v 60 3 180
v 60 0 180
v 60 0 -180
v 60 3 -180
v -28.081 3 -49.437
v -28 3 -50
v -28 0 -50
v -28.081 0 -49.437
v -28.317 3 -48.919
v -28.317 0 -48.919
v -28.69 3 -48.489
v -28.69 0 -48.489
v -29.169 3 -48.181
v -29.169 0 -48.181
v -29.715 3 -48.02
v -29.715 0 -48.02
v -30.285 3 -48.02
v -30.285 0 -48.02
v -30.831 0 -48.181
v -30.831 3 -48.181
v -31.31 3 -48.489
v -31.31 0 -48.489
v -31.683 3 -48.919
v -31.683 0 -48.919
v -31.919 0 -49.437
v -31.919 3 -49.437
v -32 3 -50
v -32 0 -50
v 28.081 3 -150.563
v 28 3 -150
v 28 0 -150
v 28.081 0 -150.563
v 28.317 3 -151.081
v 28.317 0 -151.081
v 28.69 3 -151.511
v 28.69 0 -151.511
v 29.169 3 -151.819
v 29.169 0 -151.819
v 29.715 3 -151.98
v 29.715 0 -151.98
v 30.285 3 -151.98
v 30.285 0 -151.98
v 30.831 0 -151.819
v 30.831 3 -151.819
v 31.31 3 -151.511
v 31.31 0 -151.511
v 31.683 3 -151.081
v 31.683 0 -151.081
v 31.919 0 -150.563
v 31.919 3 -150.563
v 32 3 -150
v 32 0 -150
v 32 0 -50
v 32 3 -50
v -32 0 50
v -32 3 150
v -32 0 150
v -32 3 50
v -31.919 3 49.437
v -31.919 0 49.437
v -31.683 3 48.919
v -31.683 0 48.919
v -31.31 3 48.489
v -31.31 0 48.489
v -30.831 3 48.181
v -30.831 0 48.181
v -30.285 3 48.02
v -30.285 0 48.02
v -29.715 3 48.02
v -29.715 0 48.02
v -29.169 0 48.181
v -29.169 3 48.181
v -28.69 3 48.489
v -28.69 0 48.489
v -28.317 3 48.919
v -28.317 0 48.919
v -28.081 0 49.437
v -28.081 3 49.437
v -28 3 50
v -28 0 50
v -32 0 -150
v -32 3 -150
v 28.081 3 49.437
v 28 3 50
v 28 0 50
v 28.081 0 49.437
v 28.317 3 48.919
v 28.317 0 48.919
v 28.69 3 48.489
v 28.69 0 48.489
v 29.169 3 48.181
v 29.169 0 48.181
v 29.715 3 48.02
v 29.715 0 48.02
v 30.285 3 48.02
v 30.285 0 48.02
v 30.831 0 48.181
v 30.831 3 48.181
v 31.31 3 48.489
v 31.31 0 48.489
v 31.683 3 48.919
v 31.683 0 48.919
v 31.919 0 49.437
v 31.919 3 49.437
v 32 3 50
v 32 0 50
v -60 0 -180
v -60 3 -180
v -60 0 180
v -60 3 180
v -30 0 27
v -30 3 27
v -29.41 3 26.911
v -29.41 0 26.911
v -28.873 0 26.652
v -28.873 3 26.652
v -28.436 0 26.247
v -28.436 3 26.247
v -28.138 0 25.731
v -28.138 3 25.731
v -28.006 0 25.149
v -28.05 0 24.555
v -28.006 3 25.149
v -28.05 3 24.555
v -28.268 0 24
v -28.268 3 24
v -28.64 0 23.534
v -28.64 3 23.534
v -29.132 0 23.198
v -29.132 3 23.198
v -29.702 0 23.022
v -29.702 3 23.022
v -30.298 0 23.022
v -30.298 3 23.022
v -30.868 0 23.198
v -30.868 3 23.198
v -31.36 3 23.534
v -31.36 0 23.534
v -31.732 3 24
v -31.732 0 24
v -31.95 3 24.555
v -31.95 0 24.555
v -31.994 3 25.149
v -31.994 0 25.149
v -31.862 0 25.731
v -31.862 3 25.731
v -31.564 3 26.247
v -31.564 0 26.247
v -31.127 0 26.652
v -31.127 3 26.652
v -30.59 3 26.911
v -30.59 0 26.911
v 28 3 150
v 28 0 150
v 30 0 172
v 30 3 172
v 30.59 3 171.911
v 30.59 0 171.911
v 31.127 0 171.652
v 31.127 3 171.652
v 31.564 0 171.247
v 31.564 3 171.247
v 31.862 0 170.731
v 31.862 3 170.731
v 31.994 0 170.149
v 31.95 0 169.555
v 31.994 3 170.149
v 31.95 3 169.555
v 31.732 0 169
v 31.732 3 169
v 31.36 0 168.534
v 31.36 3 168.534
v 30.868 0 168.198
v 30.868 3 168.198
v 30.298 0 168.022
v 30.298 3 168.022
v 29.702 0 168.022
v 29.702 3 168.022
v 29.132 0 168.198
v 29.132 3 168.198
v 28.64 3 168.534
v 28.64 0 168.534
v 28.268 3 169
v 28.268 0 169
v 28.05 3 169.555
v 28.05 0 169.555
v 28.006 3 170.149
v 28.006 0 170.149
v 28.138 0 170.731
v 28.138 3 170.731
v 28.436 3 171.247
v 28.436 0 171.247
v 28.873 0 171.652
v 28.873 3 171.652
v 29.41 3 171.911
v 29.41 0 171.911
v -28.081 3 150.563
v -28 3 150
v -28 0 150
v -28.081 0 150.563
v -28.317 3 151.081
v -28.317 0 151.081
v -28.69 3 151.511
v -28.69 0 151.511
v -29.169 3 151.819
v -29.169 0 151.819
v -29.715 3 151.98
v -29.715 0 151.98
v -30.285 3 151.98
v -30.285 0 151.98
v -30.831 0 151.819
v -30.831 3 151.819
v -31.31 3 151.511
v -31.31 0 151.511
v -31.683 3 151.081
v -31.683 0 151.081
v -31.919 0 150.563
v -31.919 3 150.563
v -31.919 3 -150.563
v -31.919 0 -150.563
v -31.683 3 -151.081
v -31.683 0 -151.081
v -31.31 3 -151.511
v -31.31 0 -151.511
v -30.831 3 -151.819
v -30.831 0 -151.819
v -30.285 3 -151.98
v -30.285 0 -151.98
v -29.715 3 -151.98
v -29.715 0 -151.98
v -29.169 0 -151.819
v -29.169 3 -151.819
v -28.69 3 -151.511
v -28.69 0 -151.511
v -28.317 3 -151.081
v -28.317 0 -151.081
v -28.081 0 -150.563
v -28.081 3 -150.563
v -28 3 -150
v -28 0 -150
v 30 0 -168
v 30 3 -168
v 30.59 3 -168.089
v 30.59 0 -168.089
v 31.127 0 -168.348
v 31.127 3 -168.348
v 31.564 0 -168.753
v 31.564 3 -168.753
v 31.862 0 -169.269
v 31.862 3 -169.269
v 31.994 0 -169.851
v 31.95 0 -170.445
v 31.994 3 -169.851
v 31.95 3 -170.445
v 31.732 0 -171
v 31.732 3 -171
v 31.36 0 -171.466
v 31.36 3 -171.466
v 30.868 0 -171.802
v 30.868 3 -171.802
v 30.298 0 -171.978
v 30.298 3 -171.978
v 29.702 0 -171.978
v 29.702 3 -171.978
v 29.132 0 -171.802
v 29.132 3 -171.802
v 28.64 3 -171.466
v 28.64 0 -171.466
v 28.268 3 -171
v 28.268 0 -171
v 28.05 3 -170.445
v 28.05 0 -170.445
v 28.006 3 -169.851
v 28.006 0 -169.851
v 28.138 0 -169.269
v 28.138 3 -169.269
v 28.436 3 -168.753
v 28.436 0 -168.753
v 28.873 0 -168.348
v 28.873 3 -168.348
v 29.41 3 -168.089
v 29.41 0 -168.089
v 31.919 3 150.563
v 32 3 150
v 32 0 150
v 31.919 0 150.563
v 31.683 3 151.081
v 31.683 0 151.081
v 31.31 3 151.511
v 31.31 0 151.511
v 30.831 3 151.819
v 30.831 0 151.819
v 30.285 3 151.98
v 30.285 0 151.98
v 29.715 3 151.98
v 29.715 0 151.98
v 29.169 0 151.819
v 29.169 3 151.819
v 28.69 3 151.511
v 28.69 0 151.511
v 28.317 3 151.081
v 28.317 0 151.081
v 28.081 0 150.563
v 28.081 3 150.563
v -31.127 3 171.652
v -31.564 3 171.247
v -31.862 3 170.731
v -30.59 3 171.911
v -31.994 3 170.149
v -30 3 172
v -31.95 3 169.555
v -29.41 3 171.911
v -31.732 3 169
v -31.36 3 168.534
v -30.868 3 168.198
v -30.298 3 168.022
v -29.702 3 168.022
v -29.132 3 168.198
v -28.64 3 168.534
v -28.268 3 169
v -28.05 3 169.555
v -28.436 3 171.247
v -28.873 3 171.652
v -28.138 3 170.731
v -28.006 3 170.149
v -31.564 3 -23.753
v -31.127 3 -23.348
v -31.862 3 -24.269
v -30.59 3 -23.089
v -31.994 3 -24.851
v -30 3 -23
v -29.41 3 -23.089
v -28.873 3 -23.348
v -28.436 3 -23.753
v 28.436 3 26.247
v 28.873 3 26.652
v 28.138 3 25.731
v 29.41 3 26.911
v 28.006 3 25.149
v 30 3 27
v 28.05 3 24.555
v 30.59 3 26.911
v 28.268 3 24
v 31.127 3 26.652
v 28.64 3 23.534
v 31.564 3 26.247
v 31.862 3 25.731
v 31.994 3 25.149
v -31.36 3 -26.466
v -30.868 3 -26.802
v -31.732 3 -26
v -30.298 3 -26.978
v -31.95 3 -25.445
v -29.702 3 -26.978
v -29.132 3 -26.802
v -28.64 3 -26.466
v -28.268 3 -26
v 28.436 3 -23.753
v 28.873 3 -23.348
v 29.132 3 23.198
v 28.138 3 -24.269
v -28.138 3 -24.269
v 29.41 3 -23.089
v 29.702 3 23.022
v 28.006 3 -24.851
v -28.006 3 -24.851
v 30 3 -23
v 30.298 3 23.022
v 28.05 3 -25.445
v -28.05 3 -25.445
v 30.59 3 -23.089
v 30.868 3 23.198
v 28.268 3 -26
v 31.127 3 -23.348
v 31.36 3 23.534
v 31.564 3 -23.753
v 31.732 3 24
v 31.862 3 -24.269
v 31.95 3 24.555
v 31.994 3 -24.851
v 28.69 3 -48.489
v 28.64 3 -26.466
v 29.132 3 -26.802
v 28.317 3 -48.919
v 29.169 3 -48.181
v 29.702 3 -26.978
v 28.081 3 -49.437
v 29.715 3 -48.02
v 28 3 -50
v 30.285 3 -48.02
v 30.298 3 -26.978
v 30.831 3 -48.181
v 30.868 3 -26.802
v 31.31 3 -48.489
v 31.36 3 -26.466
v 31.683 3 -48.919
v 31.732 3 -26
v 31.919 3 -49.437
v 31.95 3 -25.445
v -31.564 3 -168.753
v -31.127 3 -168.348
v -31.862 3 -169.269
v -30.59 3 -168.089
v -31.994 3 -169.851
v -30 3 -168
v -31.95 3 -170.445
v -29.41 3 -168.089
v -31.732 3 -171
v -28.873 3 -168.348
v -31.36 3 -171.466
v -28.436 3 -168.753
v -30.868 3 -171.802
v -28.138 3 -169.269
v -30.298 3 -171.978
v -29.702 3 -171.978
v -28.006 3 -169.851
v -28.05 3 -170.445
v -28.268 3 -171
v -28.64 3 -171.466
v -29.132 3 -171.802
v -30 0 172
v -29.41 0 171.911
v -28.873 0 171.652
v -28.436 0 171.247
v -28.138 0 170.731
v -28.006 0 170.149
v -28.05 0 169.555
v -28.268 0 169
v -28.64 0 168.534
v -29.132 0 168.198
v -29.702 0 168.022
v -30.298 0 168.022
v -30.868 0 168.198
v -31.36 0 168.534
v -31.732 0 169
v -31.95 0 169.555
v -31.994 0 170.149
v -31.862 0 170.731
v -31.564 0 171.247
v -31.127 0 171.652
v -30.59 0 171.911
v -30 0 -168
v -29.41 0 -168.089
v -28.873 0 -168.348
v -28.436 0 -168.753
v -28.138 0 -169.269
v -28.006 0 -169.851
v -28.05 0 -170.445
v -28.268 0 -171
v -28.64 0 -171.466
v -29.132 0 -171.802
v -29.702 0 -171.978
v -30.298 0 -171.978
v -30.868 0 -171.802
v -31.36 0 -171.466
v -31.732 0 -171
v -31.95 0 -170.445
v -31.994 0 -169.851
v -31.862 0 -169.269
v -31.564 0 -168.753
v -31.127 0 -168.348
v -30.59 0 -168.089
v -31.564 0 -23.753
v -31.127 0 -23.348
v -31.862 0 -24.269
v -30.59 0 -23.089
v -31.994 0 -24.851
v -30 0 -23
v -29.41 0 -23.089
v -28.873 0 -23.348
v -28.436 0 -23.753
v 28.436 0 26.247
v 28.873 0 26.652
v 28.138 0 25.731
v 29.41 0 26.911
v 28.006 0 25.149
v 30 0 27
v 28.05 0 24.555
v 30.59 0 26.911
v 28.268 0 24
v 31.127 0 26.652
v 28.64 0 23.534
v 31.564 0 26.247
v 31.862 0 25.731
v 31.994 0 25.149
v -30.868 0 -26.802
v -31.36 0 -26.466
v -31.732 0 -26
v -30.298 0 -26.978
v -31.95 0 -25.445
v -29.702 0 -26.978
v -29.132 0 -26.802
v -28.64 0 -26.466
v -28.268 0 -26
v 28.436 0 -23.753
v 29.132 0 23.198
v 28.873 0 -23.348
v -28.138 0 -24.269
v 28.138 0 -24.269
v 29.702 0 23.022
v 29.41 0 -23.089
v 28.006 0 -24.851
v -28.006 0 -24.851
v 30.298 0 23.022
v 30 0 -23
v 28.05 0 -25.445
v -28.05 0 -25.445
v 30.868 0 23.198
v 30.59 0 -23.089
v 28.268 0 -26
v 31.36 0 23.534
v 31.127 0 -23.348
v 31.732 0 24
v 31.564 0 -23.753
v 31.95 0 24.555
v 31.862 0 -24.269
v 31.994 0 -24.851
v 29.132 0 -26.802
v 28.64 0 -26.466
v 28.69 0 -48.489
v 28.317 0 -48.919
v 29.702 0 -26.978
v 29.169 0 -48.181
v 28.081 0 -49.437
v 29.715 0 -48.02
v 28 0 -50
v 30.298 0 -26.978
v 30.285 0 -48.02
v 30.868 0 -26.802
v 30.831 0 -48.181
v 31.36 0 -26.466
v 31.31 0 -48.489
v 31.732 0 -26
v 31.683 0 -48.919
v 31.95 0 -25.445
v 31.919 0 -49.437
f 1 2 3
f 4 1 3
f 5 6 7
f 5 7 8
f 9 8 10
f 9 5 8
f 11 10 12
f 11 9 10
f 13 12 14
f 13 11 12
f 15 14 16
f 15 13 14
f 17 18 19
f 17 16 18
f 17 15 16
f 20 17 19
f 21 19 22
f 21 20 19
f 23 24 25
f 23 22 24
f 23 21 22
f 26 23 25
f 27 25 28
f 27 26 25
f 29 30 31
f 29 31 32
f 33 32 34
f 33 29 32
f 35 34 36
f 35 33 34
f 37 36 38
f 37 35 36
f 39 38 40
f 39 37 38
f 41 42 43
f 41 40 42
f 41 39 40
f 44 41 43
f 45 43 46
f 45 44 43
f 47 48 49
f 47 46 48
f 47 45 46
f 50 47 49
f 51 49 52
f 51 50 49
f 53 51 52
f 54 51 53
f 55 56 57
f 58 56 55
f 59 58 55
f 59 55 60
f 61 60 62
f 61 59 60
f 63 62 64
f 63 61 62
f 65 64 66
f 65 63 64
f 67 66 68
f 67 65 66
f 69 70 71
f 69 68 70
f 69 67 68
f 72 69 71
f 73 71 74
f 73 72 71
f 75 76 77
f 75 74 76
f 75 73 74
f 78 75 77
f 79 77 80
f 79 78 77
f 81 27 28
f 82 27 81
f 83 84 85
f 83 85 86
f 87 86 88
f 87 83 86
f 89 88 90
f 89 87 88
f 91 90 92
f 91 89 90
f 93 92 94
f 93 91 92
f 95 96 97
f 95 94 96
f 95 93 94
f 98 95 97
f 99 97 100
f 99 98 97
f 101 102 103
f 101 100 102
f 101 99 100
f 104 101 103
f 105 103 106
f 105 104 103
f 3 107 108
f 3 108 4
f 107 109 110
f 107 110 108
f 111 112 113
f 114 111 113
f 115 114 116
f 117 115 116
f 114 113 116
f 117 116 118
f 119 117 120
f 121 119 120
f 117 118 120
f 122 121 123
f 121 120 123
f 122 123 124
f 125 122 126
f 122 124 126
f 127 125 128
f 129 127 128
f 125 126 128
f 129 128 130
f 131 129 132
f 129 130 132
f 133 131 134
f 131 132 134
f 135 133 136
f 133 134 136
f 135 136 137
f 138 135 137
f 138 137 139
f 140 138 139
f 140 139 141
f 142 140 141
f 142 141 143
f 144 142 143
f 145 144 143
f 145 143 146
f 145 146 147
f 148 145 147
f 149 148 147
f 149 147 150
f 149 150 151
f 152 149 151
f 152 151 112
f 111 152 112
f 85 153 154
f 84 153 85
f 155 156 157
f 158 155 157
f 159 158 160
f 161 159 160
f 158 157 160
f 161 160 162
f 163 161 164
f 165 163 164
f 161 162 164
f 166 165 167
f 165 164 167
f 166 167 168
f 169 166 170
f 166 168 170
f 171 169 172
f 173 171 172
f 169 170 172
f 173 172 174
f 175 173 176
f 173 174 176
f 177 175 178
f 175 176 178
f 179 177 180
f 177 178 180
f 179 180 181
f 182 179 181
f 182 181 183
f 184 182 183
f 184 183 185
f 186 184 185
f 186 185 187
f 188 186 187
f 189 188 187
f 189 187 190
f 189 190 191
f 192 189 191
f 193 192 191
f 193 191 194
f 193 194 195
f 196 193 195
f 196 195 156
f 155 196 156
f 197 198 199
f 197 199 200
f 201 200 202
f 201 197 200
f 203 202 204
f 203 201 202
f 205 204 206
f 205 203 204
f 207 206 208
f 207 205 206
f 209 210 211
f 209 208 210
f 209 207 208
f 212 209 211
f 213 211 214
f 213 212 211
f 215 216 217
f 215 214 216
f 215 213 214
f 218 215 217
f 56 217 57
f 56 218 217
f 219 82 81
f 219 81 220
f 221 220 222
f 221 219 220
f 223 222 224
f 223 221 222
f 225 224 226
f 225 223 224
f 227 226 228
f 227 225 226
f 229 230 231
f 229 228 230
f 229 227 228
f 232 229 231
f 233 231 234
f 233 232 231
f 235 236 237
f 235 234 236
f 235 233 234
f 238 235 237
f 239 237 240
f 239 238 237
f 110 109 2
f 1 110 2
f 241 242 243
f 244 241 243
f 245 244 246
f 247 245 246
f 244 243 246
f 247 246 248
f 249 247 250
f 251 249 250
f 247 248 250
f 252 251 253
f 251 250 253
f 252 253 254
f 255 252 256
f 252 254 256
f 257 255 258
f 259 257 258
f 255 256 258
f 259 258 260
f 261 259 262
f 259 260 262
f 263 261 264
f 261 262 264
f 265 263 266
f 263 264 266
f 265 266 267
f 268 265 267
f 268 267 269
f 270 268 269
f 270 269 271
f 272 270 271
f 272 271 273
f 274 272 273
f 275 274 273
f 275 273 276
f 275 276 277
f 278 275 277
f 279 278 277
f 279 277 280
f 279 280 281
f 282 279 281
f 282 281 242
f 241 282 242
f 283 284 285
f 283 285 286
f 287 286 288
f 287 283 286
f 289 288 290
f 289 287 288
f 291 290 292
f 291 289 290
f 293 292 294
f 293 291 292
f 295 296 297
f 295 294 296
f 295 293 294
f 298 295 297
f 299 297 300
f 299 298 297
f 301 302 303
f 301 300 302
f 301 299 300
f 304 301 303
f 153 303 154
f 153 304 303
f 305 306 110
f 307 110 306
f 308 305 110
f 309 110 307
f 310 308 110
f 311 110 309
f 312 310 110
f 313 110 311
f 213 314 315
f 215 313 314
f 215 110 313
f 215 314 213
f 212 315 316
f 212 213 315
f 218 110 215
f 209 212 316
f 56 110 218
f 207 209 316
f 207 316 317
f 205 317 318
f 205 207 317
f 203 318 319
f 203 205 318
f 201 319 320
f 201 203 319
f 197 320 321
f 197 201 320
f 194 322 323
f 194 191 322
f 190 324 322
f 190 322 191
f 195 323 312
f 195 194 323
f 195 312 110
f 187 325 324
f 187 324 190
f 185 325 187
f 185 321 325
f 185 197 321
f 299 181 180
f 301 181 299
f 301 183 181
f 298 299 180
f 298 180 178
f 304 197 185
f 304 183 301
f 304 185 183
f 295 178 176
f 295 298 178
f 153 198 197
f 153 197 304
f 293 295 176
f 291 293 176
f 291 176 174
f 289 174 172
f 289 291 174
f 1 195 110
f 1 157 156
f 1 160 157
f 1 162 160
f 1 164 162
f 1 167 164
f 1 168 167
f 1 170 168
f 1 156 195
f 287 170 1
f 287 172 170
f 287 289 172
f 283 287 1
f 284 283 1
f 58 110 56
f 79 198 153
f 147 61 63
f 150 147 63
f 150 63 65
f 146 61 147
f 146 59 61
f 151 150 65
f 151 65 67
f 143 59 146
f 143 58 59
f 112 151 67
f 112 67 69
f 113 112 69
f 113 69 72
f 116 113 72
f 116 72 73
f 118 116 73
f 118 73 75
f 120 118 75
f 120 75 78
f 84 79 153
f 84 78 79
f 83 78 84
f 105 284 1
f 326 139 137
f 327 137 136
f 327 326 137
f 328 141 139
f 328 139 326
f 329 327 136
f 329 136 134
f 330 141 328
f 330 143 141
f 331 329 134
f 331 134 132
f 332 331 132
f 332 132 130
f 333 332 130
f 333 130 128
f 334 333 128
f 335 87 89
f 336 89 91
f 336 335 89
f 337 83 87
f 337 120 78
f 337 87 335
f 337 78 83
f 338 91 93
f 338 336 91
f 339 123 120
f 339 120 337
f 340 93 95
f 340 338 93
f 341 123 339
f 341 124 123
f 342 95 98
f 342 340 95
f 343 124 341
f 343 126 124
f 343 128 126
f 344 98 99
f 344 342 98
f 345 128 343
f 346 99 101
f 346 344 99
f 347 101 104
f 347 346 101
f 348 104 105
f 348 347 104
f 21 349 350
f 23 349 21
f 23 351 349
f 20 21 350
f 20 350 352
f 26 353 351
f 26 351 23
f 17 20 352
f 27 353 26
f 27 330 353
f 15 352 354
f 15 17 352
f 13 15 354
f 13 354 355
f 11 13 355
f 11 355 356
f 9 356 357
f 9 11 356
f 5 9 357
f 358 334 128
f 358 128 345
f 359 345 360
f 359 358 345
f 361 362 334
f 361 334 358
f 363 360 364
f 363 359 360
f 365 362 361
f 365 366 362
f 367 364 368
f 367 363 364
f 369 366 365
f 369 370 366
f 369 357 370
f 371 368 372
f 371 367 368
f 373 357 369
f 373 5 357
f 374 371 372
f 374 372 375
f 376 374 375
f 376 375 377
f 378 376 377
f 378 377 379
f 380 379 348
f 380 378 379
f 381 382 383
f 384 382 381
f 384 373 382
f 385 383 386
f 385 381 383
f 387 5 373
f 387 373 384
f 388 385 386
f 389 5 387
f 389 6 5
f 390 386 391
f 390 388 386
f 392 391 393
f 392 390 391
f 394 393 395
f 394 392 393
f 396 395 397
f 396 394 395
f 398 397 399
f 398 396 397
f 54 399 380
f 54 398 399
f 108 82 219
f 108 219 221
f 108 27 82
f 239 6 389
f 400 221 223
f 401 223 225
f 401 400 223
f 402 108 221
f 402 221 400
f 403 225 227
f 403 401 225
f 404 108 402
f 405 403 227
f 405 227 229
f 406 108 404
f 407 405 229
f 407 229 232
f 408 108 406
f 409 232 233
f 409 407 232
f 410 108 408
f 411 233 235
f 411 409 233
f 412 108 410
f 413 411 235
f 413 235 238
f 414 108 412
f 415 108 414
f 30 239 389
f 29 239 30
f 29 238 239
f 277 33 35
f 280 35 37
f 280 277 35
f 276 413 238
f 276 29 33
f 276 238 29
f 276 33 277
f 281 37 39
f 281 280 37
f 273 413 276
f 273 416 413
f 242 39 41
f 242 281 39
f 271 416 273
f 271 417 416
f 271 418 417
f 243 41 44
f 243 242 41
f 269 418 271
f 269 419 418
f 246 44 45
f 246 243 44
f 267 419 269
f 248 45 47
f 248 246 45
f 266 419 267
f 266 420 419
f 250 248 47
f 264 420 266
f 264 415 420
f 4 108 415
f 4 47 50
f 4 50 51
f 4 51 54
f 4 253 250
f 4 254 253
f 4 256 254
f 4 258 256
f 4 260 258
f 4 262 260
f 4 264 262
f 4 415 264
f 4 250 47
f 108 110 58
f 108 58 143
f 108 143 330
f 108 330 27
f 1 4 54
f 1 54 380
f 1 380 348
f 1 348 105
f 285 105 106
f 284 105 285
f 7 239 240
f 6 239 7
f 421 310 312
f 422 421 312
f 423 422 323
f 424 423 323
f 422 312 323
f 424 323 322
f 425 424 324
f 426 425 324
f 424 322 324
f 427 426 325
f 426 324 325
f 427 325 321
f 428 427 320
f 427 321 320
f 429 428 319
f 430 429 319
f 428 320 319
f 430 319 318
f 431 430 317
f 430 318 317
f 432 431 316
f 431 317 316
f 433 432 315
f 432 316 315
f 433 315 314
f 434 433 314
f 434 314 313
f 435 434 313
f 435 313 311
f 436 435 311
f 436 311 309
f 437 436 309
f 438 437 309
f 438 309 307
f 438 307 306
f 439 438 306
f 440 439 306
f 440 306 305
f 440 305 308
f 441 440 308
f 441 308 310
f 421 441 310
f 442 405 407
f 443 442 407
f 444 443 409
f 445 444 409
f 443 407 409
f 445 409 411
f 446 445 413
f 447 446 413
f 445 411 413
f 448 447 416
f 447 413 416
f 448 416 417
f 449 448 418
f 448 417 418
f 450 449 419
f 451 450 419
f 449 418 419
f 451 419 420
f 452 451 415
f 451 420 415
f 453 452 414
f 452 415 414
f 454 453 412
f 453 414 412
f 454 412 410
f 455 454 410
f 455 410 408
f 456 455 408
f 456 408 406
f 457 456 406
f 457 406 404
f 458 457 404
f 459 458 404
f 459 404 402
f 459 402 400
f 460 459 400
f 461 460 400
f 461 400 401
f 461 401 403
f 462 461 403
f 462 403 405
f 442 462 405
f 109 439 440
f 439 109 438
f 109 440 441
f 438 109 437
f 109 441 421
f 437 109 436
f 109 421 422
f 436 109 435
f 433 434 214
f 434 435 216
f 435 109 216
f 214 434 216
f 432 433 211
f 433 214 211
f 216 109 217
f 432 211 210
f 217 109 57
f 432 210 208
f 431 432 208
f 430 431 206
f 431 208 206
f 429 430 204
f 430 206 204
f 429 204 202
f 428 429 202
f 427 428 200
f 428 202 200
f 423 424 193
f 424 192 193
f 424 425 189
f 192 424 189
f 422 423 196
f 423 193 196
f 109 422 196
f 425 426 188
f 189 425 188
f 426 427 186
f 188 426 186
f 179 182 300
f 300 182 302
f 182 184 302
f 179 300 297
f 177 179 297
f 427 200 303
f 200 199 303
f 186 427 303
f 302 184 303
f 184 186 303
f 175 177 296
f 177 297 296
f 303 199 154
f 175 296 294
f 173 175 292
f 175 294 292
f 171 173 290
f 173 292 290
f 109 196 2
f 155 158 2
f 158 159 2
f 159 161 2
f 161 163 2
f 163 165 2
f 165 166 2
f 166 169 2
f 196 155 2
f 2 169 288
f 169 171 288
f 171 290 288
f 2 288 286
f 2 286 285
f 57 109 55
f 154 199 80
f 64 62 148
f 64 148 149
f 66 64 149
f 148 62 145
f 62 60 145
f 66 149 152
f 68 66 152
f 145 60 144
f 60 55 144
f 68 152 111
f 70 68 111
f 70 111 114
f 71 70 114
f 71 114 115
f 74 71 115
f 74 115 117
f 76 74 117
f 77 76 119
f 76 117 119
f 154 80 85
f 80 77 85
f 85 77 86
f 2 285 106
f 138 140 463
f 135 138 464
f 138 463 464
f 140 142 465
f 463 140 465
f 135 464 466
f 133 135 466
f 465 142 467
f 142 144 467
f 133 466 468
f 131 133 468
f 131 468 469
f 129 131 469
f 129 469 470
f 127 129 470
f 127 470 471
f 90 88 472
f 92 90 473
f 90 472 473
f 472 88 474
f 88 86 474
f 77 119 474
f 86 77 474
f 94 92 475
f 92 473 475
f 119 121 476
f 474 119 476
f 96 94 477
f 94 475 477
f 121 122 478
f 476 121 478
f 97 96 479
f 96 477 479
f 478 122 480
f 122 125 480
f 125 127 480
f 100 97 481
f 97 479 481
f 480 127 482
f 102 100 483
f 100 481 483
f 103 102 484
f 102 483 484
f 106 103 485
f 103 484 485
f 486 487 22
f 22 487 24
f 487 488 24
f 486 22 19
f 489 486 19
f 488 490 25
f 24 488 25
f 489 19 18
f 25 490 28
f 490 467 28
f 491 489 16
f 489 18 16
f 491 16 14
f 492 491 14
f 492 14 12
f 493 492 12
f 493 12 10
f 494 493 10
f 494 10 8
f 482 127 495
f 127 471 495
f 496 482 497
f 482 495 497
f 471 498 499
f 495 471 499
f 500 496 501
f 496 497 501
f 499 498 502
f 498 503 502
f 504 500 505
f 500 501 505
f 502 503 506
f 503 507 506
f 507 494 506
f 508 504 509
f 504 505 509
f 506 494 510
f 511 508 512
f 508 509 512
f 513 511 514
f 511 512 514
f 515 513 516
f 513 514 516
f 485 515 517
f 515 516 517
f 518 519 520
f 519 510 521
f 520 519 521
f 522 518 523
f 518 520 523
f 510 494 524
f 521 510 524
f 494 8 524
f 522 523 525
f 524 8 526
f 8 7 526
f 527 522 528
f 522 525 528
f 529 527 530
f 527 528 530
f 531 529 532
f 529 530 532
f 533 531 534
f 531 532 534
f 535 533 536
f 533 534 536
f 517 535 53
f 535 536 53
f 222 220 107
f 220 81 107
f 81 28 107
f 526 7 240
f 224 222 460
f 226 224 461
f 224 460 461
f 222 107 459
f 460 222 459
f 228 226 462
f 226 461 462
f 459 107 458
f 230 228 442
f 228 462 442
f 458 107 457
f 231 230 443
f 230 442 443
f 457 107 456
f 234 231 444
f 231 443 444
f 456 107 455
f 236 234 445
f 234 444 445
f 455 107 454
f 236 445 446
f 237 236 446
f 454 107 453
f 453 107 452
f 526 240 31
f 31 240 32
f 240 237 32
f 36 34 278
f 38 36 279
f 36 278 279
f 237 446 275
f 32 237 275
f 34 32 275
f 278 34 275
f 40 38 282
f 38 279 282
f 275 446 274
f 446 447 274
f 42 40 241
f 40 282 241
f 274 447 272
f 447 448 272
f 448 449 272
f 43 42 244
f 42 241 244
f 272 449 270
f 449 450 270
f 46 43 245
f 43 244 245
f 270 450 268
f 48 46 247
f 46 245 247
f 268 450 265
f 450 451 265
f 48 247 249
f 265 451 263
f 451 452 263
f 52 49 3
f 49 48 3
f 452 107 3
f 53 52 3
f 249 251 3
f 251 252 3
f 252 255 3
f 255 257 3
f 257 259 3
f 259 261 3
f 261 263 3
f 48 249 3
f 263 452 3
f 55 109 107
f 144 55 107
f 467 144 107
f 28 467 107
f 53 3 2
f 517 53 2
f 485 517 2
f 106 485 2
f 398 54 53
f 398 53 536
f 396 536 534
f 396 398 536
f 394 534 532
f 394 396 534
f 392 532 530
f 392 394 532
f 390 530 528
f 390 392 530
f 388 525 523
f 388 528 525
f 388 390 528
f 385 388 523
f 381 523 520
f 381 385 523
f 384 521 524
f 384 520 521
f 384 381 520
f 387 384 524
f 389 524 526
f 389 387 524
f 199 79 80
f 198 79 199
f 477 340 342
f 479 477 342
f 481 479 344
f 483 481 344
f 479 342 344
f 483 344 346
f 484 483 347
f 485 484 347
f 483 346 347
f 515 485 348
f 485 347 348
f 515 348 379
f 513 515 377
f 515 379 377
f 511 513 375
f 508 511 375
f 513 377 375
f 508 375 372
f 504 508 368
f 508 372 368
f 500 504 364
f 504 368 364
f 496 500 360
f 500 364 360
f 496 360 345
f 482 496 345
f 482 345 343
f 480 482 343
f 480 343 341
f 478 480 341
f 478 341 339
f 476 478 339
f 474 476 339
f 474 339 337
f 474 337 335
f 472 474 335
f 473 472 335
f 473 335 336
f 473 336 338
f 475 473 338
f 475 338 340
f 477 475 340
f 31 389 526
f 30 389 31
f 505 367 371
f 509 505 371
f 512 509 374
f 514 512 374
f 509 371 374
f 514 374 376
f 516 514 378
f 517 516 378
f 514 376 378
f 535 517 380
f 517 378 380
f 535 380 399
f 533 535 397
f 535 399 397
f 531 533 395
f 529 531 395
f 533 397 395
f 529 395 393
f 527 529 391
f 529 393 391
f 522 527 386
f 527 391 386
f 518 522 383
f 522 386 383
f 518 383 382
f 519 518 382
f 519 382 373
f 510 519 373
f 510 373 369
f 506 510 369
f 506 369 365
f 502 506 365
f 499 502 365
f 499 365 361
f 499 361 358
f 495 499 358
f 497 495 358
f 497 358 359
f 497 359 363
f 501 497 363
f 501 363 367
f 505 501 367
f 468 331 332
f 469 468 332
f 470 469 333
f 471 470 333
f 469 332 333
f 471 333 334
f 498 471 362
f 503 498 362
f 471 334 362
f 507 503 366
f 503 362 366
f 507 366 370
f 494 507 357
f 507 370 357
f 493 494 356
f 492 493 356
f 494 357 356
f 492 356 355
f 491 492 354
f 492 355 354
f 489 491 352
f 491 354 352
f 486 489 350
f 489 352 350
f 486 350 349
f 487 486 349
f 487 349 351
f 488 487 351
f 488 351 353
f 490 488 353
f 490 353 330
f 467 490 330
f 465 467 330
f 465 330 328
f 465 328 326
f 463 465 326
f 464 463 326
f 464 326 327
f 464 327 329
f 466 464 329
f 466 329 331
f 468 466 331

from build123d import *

# Parameters (mm, degrees)
SKETCH1_W           = 120
SKETCH1_H           = 360
BOSS_EXTRUDE1_DEPTH = 3
SKETCH2_R           = 2
CUT_EXTRUDE2_DEPTH  = 190.76037521
CUT_EXTRUDE3_DEPTH  = 190.76037521


with BuildPart() as part:
    # Sketch1 → Boss-Extrude1 (new body)
    with BuildSketch(Plane(origin=(0, 0, 0), x_dir=(1, 0, 0), z_dir=(0, 1, 0))):
        Rectangle(SKETCH1_W, SKETCH1_H)
    extrude(amount=BOSS_EXTRUDE1_DEPTH)

    # Sketch2 → Cut-Extrude2 (cut, through all)
    with BuildSketch(Plane(origin=(0, 3, 0), x_dir=(1, 0, 0), z_dir=(0, 1, 0))):
        with Locations(Location((-30, 170, 0), (0, 0, 270))):
            Circle(SKETCH2_R)
        with Locations(Location((30, 170, 0), (0, 0, 270))):
            Circle(SKETCH2_R)
        with Locations(Location((-30, -170, 0), (0, 0, 270))):
            Circle(SKETCH2_R)
        with Locations(Location((30, -170, 0), (0, 0, 270))):
            Circle(SKETCH2_R)
        with Locations(Location((-30, 25, 0), (0, 0, 270))):
            Circle(SKETCH2_R)
        with Locations(Location((30, 25, 0), (0, 0, 270))):
            Circle(SKETCH2_R)
        with Locations(Location((-30, -25, 0), (0, 0, 270))):
            Circle(SKETCH2_R)
        with Locations(Location((30, -25, 0), (0, 0, 270))):
            Circle(SKETCH2_R)
    extrude(amount=-CUT_EXTRUDE2_DEPTH, mode=Mode.SUBTRACT)

    # Sketch3 → Cut-Extrude3 (cut, through all)
    with BuildSketch(Plane(origin=(0, 3, 0), x_dir=(1, 0, 0), z_dir=(0, 1, 0))):
        with BuildLine():
            Line((32, 150), (32, 50))
            ThreePointArc((32, 50), (30, 48), (28, 50))
            Line((28, 50), (28, 150))
            ThreePointArc((28, 150), (30, 152), (32, 150))
        make_face()
        with BuildLine():
            Line((-28, 150), (-28, 50))
            ThreePointArc((-28, 50), (-30, 48), (-32, 50))
            Line((-32, 50), (-32, 150))
            ThreePointArc((-32, 150), (-30, 152), (-28, 150))
        make_face()
        with BuildLine():
            Line((28, -150), (28, -50))
            ThreePointArc((28, -50), (30, -48), (32, -50))
            Line((32, -50), (32, -150))
            ThreePointArc((32, -150), (30, -152), (28, -150))
        make_face()
        with BuildLine():
            Line((-32, -150), (-32, -50))
            ThreePointArc((-32, -50), (-30, -48), (-28, -50))
            Line((-28, -50), (-28, -150))
            ThreePointArc((-28, -150), (-30, -152), (-32, -150))
        make_face()
    extrude(amount=-CUT_EXTRUDE3_DEPTH, mode=Mode.SUBTRACT)


solid = part.part
